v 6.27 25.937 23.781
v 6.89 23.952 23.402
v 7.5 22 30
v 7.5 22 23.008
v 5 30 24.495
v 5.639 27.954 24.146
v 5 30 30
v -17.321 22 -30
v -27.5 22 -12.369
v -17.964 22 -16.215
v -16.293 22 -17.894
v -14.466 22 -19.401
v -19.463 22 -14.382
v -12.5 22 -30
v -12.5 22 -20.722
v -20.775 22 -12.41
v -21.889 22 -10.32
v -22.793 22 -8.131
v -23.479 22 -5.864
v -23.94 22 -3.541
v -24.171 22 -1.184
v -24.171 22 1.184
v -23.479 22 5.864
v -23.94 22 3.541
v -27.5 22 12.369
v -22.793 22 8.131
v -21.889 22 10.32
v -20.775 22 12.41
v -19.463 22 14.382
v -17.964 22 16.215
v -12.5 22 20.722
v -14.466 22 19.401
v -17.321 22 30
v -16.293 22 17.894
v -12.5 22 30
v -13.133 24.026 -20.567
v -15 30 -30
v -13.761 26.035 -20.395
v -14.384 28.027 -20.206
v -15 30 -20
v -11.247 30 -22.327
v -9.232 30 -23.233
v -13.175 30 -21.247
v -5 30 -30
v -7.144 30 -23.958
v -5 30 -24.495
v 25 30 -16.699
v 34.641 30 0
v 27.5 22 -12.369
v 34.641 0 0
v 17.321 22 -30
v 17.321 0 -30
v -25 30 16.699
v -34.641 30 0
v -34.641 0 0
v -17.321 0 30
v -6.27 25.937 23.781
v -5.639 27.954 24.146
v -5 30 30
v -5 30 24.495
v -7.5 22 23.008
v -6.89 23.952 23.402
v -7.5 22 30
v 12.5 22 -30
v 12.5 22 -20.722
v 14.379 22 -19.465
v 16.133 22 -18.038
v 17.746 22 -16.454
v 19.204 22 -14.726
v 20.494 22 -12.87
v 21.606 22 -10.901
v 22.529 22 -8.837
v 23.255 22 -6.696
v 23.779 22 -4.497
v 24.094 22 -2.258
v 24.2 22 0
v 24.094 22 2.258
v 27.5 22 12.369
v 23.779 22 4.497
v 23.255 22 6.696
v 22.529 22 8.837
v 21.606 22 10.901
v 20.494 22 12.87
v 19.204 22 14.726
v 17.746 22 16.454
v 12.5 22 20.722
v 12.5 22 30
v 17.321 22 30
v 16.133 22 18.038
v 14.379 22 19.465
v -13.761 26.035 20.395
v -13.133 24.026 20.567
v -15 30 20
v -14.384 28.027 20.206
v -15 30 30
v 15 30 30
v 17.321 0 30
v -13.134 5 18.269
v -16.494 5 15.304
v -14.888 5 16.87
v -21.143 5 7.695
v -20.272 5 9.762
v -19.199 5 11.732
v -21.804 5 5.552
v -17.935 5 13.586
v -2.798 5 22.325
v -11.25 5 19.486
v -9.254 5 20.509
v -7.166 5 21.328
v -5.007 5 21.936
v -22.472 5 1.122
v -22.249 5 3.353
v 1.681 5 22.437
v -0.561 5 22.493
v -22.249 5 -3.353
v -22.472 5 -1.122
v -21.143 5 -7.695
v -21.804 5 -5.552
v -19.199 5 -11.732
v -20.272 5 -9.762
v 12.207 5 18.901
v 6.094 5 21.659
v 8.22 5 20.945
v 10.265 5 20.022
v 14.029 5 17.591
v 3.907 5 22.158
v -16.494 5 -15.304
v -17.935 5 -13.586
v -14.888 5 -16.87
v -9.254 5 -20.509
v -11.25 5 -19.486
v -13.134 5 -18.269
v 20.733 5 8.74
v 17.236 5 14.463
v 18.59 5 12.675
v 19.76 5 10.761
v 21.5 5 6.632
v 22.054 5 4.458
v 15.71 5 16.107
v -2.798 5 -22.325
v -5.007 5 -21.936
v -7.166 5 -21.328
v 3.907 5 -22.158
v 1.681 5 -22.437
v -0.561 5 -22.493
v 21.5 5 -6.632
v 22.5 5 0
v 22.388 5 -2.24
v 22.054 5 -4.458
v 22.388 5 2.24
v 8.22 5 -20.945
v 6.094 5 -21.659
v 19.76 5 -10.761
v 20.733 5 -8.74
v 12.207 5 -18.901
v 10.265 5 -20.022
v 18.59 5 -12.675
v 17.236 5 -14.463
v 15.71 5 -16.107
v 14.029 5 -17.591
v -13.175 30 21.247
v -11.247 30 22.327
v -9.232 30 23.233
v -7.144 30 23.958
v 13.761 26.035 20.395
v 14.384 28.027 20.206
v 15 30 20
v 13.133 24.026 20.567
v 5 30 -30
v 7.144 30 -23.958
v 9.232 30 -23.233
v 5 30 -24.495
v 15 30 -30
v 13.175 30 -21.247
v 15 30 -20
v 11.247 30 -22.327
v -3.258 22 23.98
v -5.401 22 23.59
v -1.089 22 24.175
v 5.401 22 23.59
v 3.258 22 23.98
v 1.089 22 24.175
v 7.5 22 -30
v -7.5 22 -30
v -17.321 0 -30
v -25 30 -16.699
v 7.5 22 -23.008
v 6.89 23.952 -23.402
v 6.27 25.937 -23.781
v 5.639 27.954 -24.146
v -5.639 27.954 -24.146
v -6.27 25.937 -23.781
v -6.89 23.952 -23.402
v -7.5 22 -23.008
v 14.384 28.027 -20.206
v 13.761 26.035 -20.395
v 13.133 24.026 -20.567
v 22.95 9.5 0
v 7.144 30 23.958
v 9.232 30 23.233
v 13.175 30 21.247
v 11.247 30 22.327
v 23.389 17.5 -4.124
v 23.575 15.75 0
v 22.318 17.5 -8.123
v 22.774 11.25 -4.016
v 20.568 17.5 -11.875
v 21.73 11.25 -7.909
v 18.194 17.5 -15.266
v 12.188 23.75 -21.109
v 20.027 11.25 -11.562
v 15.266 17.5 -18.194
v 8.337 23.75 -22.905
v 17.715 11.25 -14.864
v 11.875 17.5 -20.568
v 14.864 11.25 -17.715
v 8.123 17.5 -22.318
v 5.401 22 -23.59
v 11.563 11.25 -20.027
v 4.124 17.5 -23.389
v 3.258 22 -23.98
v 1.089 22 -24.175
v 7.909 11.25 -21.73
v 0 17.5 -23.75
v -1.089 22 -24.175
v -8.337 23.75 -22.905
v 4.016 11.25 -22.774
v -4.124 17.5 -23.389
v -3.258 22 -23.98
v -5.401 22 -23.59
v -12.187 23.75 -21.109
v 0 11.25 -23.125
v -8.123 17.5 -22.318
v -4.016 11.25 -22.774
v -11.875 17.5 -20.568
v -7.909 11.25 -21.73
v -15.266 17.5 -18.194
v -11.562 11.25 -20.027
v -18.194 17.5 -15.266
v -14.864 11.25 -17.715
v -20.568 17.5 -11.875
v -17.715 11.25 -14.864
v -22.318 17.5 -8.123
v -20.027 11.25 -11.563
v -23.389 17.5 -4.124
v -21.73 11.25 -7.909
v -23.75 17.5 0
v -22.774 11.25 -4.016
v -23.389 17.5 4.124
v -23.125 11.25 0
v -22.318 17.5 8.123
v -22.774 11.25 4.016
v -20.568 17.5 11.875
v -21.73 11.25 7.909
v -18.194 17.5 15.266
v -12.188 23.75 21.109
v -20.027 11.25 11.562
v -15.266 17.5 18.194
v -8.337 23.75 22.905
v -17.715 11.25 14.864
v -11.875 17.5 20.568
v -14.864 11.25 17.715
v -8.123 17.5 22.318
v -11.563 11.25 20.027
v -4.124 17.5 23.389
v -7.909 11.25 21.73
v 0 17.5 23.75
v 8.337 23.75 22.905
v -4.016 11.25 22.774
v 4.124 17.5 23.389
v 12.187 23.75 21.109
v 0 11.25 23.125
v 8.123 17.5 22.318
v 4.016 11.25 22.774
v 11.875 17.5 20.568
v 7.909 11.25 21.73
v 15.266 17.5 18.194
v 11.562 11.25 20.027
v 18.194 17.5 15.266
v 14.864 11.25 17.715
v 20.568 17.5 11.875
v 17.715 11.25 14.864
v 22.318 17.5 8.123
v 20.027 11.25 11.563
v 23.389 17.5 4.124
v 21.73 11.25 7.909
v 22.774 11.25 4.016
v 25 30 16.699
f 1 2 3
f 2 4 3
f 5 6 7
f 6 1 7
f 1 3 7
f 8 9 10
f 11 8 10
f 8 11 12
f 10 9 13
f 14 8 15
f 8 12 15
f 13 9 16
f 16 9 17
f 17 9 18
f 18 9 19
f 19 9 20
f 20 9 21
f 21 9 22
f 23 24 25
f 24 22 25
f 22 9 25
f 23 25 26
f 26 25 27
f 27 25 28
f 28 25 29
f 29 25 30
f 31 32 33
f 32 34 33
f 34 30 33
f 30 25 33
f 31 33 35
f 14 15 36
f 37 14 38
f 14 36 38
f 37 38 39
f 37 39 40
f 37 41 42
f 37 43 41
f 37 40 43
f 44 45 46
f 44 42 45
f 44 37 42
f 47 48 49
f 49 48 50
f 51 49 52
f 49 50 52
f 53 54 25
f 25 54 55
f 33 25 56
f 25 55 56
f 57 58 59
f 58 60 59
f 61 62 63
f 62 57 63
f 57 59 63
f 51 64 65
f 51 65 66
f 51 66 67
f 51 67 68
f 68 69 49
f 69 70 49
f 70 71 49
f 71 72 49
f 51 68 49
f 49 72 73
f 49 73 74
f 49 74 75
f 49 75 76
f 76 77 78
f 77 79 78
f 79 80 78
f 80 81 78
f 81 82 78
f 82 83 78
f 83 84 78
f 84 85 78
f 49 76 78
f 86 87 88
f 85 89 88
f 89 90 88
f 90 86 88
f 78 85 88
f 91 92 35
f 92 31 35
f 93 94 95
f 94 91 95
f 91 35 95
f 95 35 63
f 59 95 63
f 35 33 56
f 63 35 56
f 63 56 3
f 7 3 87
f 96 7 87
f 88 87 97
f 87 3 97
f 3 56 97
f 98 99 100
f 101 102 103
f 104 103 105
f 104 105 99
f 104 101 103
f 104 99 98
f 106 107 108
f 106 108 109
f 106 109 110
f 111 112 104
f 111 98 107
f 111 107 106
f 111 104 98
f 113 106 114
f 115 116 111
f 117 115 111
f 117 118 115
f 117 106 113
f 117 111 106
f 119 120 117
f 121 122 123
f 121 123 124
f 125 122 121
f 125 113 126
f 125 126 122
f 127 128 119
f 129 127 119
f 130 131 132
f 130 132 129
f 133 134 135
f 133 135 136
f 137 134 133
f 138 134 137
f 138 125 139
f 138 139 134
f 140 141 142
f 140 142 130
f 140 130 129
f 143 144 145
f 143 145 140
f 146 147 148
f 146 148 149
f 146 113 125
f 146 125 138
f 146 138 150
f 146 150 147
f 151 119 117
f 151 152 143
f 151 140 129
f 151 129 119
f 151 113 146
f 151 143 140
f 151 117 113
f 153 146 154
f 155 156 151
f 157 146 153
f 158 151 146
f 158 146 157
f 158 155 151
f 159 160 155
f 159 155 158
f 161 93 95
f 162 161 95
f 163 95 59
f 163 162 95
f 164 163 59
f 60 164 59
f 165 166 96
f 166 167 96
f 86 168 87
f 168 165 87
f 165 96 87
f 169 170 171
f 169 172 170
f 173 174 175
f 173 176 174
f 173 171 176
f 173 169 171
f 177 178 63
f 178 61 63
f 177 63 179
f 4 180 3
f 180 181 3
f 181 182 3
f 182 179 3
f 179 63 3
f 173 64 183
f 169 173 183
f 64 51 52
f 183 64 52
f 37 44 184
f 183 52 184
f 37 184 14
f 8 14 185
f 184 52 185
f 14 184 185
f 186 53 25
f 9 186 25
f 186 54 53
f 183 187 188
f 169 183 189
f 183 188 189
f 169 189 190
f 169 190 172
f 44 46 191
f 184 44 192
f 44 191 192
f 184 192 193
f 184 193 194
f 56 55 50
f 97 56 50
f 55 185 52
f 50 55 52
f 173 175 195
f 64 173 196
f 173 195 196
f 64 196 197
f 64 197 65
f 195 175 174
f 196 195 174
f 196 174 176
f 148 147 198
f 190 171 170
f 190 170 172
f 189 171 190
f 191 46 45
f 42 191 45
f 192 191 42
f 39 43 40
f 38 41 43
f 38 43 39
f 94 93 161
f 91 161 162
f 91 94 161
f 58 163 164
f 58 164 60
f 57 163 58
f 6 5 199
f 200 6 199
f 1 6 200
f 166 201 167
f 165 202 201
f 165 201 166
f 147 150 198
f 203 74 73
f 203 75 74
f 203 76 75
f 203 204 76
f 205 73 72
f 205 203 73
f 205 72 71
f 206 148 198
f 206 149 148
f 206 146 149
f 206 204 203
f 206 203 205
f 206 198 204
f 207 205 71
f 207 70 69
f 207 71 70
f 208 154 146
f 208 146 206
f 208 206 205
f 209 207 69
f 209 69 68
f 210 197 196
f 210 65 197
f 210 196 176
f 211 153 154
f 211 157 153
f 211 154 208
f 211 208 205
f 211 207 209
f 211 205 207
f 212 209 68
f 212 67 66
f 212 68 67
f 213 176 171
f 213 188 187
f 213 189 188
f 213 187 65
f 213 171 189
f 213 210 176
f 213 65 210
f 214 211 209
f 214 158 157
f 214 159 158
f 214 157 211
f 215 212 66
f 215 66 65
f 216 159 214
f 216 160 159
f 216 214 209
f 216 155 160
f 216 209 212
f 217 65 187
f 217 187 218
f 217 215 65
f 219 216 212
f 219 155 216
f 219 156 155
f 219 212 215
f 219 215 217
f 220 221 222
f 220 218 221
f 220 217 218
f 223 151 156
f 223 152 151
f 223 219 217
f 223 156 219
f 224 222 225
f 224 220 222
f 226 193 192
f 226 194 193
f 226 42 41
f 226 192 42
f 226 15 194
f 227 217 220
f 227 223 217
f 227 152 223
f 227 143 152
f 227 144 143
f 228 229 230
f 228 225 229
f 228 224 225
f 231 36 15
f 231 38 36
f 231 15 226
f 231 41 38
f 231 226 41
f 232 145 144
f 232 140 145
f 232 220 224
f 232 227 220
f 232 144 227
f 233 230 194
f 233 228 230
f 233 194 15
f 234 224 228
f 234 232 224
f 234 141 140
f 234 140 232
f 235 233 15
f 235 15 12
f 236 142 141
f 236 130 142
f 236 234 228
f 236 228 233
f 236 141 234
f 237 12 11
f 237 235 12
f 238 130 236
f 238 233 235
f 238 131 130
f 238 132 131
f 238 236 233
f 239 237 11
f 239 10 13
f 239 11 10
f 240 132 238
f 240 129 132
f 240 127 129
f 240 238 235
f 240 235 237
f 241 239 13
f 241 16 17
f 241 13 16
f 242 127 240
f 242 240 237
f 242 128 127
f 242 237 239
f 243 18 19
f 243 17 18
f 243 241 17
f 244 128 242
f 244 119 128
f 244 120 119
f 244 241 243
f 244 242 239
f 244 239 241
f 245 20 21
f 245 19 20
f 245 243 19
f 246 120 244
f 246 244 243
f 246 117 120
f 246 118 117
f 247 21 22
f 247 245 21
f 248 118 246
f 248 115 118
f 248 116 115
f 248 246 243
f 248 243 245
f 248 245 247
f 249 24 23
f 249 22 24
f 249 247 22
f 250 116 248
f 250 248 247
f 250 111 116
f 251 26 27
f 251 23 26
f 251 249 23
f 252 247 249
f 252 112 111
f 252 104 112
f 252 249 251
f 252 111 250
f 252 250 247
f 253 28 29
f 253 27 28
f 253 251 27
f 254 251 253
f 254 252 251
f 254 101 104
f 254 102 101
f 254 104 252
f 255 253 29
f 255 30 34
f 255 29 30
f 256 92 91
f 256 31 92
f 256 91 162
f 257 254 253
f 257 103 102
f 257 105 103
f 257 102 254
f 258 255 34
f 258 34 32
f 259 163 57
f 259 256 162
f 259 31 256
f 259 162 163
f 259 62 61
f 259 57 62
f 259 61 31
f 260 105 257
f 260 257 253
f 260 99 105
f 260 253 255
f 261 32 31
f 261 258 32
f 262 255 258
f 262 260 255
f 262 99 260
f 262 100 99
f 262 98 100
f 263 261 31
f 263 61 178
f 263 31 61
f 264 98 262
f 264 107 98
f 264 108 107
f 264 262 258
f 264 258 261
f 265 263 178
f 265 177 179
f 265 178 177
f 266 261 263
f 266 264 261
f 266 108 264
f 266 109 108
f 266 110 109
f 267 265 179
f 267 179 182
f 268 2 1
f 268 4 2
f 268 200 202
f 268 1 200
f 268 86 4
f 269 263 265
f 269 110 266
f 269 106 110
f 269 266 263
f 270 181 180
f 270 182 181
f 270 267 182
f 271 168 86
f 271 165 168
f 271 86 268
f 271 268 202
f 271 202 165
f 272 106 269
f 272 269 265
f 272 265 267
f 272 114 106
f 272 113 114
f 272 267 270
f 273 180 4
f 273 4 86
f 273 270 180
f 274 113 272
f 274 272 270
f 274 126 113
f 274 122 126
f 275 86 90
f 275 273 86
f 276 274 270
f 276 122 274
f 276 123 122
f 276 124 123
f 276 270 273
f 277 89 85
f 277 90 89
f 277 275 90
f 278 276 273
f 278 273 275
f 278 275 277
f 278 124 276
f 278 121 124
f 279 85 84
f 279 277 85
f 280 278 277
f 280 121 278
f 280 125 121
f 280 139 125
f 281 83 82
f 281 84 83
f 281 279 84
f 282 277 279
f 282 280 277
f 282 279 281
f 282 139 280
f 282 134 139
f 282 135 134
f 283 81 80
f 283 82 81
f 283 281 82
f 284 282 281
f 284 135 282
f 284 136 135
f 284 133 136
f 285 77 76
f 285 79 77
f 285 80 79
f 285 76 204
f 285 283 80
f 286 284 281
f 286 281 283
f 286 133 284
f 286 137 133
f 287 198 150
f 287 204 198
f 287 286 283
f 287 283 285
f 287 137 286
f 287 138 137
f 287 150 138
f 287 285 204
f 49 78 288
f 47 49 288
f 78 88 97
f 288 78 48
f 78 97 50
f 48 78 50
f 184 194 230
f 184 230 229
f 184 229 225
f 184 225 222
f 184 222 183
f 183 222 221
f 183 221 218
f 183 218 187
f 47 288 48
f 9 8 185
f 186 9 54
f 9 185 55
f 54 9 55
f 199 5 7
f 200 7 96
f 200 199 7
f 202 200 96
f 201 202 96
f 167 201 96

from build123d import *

# Parameters (mm, degrees)
EXTRUDE_1_DEPTH               = 30
CUT_EXTRUDE_1_DEPTH           = 55.772255751
PATTERN_LINEAR_1_COUNT        = 2
PATTERN_LINEAR_1_PITCH        = 20
PATTERN_LINEAR_2_COPY_1_DEPTH = 55.772255751
PATTERN_LINEAR_2_COPY_2_DEPTH = 55.772255751


with BuildPart() as part:
    # 草圖1 → 填料-伸長1 (new body)
    with BuildSketch(Plane(origin=(0, 0, 0), x_dir=(1, 0, 0), z_dir=(0, 1, 0))):
        Polygon((17.320508076, -30), (34.641016151, 0), (17.320508076, 30), (-17.320508076, 30), (-34.641016151, 0), (-17.320508076, -30), align=None)
    extrude(amount=EXTRUDE_1_DEPTH)

    # 草圖2 → 除料-旋轉1 (revolve, cut)
    with BuildSketch(Plane.XY):
        Polygon((0, 30), (25, 30), (22.5, 5), (0, 5), align=None)
    revolve(axis=Axis((0, 5, 0), (0, 1, 0)), mode=Mode.SUBTRACT)

    # 草圖3 → 除料-伸長1 (cut, symmetric)
    with BuildSketch(Plane.XY):
        Polygon((-5, 30), (-7.5, 22), (7.5, 22), (5, 30), align=None)
    cut_extrude_1 = extrude(amount=CUT_EXTRUDE_1_DEPTH, both=True, mode=Mode.SUBTRACT)

    # 直線複製排列1: 除料-伸長1 ×2
    with Locations(*[(-i * PATTERN_LINEAR_1_PITCH, 0, 0) for i in range(1, PATTERN_LINEAR_1_COUNT)]):
        add(cut_extrude_1, mode=Mode.SUBTRACT)

    # 直線複製排列2 copy 1 sketch → 直線複製排列2 copy 1 (cut, symmetric)
    with BuildSketch(Plane.XY):
        Polygon((-5, 30), (-7.5, 22), (7.5, 22), (5, 30), align=None)
    extrude(amount=PATTERN_LINEAR_2_COPY_1_DEPTH, both=True, mode=Mode.SUBTRACT)

    # 直線複製排列2 copy 2 sketch → 直線複製排列2 copy 2 (cut, symmetric)
    with BuildSketch(Plane(origin=(20, 0, 0), x_dir=(1, 0, 0), z_dir=(0, 0, 1))):
        Polygon((-5, 30), (-7.5, 22), (7.5, 22), (5, 30), align=None)
    extrude(amount=PATTERN_LINEAR_2_COPY_2_DEPTH, both=True, mode=Mode.SUBTRACT)


solid = part.part
